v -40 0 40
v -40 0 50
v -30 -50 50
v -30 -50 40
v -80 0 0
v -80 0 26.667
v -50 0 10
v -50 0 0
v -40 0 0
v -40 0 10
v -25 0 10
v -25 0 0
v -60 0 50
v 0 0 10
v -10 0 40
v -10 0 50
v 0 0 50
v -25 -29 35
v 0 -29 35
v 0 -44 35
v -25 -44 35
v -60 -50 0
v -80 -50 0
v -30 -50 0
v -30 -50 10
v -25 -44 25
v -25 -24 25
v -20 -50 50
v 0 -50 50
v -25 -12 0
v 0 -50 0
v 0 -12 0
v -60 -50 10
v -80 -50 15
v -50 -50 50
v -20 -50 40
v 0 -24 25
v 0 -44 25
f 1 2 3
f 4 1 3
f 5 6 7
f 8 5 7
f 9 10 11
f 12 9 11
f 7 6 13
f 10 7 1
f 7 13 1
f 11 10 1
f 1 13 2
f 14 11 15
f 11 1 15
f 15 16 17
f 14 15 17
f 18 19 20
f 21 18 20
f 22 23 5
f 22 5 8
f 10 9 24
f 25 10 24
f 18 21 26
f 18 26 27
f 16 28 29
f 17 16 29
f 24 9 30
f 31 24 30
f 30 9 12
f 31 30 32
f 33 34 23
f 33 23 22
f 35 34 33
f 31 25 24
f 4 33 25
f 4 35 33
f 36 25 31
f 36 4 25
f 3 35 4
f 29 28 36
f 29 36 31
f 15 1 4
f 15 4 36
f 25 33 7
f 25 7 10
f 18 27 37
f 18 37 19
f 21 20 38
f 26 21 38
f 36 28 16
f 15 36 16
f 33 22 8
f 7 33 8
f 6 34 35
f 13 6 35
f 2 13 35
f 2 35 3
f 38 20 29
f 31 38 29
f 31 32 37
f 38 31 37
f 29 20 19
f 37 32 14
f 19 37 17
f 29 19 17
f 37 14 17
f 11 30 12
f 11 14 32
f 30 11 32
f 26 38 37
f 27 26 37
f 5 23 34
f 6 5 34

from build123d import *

# Parameters (mm, degrees)
F0_W     = 80
F0_H     = 50
F1_DEPTH = 50
F3_DEPTH = 10
F5_DEPTH = 10
F7_DEPTH = 25
F9_DEPTH = 25


with BuildPart() as f1:
    # F0 (on Front) → F1 (new body)
    with BuildSketch(Plane.XZ):
        with Locations((-40, 25)):
            Rectangle(F0_W, F0_H)
    extrude(amount=F1_DEPTH)

    # F2 (on face) → F3 (cut)
    with BuildSketch(Plane(origin=(0, 0, 0), x_dir=(1, 0, 0), z_dir=(0, 0, -1))):
        Polygon((-30, 50), (-60, 50), (-50, 0), (-40, 0), align=None)
    extrude(amount=-F3_DEPTH, mode=Mode.SUBTRACT)

    # F4 (on face) → F5 (cut)
    with BuildSketch(Plane.XY.offset(50)):
        Polygon((-40, 0), (-30, -50), (-20, -50), (-10, 0), align=None)
    extrude(amount=-F5_DEPTH, mode=Mode.SUBTRACT)

    # F6 (on face) → F7 (cut)
    with BuildSketch(Plane.YZ):
        Polygon((-29, 35), (-44, 35), (-44, 25), (-24, 25), align=None)
    extrude(amount=-F7_DEPTH, mode=Mode.SUBTRACT)

    # F8 (on face) → F9 (cut)
    with BuildSketch(Plane.YZ):
        Polygon((0, 10), (-12, 0), (0, 0), align=None)
    extrude(amount=-F9_DEPTH, mode=Mode.SUBTRACT)

    # F13: sweep along a path in F12
    with BuildLine(Plane.XY.offset(50)) as f13_path:
        Line((-60, 0), (-50, -50))
    # F10 (on face) → F13 (sweep, cut)
    with BuildSketch(Plane.XZ.offset(50)):
        Polygon((-50, 50), (-80, 50), (-80, 15), align=None)
    sweep(path=f13_path.line, mode=Mode.SUBTRACT)


solid = f1.part
